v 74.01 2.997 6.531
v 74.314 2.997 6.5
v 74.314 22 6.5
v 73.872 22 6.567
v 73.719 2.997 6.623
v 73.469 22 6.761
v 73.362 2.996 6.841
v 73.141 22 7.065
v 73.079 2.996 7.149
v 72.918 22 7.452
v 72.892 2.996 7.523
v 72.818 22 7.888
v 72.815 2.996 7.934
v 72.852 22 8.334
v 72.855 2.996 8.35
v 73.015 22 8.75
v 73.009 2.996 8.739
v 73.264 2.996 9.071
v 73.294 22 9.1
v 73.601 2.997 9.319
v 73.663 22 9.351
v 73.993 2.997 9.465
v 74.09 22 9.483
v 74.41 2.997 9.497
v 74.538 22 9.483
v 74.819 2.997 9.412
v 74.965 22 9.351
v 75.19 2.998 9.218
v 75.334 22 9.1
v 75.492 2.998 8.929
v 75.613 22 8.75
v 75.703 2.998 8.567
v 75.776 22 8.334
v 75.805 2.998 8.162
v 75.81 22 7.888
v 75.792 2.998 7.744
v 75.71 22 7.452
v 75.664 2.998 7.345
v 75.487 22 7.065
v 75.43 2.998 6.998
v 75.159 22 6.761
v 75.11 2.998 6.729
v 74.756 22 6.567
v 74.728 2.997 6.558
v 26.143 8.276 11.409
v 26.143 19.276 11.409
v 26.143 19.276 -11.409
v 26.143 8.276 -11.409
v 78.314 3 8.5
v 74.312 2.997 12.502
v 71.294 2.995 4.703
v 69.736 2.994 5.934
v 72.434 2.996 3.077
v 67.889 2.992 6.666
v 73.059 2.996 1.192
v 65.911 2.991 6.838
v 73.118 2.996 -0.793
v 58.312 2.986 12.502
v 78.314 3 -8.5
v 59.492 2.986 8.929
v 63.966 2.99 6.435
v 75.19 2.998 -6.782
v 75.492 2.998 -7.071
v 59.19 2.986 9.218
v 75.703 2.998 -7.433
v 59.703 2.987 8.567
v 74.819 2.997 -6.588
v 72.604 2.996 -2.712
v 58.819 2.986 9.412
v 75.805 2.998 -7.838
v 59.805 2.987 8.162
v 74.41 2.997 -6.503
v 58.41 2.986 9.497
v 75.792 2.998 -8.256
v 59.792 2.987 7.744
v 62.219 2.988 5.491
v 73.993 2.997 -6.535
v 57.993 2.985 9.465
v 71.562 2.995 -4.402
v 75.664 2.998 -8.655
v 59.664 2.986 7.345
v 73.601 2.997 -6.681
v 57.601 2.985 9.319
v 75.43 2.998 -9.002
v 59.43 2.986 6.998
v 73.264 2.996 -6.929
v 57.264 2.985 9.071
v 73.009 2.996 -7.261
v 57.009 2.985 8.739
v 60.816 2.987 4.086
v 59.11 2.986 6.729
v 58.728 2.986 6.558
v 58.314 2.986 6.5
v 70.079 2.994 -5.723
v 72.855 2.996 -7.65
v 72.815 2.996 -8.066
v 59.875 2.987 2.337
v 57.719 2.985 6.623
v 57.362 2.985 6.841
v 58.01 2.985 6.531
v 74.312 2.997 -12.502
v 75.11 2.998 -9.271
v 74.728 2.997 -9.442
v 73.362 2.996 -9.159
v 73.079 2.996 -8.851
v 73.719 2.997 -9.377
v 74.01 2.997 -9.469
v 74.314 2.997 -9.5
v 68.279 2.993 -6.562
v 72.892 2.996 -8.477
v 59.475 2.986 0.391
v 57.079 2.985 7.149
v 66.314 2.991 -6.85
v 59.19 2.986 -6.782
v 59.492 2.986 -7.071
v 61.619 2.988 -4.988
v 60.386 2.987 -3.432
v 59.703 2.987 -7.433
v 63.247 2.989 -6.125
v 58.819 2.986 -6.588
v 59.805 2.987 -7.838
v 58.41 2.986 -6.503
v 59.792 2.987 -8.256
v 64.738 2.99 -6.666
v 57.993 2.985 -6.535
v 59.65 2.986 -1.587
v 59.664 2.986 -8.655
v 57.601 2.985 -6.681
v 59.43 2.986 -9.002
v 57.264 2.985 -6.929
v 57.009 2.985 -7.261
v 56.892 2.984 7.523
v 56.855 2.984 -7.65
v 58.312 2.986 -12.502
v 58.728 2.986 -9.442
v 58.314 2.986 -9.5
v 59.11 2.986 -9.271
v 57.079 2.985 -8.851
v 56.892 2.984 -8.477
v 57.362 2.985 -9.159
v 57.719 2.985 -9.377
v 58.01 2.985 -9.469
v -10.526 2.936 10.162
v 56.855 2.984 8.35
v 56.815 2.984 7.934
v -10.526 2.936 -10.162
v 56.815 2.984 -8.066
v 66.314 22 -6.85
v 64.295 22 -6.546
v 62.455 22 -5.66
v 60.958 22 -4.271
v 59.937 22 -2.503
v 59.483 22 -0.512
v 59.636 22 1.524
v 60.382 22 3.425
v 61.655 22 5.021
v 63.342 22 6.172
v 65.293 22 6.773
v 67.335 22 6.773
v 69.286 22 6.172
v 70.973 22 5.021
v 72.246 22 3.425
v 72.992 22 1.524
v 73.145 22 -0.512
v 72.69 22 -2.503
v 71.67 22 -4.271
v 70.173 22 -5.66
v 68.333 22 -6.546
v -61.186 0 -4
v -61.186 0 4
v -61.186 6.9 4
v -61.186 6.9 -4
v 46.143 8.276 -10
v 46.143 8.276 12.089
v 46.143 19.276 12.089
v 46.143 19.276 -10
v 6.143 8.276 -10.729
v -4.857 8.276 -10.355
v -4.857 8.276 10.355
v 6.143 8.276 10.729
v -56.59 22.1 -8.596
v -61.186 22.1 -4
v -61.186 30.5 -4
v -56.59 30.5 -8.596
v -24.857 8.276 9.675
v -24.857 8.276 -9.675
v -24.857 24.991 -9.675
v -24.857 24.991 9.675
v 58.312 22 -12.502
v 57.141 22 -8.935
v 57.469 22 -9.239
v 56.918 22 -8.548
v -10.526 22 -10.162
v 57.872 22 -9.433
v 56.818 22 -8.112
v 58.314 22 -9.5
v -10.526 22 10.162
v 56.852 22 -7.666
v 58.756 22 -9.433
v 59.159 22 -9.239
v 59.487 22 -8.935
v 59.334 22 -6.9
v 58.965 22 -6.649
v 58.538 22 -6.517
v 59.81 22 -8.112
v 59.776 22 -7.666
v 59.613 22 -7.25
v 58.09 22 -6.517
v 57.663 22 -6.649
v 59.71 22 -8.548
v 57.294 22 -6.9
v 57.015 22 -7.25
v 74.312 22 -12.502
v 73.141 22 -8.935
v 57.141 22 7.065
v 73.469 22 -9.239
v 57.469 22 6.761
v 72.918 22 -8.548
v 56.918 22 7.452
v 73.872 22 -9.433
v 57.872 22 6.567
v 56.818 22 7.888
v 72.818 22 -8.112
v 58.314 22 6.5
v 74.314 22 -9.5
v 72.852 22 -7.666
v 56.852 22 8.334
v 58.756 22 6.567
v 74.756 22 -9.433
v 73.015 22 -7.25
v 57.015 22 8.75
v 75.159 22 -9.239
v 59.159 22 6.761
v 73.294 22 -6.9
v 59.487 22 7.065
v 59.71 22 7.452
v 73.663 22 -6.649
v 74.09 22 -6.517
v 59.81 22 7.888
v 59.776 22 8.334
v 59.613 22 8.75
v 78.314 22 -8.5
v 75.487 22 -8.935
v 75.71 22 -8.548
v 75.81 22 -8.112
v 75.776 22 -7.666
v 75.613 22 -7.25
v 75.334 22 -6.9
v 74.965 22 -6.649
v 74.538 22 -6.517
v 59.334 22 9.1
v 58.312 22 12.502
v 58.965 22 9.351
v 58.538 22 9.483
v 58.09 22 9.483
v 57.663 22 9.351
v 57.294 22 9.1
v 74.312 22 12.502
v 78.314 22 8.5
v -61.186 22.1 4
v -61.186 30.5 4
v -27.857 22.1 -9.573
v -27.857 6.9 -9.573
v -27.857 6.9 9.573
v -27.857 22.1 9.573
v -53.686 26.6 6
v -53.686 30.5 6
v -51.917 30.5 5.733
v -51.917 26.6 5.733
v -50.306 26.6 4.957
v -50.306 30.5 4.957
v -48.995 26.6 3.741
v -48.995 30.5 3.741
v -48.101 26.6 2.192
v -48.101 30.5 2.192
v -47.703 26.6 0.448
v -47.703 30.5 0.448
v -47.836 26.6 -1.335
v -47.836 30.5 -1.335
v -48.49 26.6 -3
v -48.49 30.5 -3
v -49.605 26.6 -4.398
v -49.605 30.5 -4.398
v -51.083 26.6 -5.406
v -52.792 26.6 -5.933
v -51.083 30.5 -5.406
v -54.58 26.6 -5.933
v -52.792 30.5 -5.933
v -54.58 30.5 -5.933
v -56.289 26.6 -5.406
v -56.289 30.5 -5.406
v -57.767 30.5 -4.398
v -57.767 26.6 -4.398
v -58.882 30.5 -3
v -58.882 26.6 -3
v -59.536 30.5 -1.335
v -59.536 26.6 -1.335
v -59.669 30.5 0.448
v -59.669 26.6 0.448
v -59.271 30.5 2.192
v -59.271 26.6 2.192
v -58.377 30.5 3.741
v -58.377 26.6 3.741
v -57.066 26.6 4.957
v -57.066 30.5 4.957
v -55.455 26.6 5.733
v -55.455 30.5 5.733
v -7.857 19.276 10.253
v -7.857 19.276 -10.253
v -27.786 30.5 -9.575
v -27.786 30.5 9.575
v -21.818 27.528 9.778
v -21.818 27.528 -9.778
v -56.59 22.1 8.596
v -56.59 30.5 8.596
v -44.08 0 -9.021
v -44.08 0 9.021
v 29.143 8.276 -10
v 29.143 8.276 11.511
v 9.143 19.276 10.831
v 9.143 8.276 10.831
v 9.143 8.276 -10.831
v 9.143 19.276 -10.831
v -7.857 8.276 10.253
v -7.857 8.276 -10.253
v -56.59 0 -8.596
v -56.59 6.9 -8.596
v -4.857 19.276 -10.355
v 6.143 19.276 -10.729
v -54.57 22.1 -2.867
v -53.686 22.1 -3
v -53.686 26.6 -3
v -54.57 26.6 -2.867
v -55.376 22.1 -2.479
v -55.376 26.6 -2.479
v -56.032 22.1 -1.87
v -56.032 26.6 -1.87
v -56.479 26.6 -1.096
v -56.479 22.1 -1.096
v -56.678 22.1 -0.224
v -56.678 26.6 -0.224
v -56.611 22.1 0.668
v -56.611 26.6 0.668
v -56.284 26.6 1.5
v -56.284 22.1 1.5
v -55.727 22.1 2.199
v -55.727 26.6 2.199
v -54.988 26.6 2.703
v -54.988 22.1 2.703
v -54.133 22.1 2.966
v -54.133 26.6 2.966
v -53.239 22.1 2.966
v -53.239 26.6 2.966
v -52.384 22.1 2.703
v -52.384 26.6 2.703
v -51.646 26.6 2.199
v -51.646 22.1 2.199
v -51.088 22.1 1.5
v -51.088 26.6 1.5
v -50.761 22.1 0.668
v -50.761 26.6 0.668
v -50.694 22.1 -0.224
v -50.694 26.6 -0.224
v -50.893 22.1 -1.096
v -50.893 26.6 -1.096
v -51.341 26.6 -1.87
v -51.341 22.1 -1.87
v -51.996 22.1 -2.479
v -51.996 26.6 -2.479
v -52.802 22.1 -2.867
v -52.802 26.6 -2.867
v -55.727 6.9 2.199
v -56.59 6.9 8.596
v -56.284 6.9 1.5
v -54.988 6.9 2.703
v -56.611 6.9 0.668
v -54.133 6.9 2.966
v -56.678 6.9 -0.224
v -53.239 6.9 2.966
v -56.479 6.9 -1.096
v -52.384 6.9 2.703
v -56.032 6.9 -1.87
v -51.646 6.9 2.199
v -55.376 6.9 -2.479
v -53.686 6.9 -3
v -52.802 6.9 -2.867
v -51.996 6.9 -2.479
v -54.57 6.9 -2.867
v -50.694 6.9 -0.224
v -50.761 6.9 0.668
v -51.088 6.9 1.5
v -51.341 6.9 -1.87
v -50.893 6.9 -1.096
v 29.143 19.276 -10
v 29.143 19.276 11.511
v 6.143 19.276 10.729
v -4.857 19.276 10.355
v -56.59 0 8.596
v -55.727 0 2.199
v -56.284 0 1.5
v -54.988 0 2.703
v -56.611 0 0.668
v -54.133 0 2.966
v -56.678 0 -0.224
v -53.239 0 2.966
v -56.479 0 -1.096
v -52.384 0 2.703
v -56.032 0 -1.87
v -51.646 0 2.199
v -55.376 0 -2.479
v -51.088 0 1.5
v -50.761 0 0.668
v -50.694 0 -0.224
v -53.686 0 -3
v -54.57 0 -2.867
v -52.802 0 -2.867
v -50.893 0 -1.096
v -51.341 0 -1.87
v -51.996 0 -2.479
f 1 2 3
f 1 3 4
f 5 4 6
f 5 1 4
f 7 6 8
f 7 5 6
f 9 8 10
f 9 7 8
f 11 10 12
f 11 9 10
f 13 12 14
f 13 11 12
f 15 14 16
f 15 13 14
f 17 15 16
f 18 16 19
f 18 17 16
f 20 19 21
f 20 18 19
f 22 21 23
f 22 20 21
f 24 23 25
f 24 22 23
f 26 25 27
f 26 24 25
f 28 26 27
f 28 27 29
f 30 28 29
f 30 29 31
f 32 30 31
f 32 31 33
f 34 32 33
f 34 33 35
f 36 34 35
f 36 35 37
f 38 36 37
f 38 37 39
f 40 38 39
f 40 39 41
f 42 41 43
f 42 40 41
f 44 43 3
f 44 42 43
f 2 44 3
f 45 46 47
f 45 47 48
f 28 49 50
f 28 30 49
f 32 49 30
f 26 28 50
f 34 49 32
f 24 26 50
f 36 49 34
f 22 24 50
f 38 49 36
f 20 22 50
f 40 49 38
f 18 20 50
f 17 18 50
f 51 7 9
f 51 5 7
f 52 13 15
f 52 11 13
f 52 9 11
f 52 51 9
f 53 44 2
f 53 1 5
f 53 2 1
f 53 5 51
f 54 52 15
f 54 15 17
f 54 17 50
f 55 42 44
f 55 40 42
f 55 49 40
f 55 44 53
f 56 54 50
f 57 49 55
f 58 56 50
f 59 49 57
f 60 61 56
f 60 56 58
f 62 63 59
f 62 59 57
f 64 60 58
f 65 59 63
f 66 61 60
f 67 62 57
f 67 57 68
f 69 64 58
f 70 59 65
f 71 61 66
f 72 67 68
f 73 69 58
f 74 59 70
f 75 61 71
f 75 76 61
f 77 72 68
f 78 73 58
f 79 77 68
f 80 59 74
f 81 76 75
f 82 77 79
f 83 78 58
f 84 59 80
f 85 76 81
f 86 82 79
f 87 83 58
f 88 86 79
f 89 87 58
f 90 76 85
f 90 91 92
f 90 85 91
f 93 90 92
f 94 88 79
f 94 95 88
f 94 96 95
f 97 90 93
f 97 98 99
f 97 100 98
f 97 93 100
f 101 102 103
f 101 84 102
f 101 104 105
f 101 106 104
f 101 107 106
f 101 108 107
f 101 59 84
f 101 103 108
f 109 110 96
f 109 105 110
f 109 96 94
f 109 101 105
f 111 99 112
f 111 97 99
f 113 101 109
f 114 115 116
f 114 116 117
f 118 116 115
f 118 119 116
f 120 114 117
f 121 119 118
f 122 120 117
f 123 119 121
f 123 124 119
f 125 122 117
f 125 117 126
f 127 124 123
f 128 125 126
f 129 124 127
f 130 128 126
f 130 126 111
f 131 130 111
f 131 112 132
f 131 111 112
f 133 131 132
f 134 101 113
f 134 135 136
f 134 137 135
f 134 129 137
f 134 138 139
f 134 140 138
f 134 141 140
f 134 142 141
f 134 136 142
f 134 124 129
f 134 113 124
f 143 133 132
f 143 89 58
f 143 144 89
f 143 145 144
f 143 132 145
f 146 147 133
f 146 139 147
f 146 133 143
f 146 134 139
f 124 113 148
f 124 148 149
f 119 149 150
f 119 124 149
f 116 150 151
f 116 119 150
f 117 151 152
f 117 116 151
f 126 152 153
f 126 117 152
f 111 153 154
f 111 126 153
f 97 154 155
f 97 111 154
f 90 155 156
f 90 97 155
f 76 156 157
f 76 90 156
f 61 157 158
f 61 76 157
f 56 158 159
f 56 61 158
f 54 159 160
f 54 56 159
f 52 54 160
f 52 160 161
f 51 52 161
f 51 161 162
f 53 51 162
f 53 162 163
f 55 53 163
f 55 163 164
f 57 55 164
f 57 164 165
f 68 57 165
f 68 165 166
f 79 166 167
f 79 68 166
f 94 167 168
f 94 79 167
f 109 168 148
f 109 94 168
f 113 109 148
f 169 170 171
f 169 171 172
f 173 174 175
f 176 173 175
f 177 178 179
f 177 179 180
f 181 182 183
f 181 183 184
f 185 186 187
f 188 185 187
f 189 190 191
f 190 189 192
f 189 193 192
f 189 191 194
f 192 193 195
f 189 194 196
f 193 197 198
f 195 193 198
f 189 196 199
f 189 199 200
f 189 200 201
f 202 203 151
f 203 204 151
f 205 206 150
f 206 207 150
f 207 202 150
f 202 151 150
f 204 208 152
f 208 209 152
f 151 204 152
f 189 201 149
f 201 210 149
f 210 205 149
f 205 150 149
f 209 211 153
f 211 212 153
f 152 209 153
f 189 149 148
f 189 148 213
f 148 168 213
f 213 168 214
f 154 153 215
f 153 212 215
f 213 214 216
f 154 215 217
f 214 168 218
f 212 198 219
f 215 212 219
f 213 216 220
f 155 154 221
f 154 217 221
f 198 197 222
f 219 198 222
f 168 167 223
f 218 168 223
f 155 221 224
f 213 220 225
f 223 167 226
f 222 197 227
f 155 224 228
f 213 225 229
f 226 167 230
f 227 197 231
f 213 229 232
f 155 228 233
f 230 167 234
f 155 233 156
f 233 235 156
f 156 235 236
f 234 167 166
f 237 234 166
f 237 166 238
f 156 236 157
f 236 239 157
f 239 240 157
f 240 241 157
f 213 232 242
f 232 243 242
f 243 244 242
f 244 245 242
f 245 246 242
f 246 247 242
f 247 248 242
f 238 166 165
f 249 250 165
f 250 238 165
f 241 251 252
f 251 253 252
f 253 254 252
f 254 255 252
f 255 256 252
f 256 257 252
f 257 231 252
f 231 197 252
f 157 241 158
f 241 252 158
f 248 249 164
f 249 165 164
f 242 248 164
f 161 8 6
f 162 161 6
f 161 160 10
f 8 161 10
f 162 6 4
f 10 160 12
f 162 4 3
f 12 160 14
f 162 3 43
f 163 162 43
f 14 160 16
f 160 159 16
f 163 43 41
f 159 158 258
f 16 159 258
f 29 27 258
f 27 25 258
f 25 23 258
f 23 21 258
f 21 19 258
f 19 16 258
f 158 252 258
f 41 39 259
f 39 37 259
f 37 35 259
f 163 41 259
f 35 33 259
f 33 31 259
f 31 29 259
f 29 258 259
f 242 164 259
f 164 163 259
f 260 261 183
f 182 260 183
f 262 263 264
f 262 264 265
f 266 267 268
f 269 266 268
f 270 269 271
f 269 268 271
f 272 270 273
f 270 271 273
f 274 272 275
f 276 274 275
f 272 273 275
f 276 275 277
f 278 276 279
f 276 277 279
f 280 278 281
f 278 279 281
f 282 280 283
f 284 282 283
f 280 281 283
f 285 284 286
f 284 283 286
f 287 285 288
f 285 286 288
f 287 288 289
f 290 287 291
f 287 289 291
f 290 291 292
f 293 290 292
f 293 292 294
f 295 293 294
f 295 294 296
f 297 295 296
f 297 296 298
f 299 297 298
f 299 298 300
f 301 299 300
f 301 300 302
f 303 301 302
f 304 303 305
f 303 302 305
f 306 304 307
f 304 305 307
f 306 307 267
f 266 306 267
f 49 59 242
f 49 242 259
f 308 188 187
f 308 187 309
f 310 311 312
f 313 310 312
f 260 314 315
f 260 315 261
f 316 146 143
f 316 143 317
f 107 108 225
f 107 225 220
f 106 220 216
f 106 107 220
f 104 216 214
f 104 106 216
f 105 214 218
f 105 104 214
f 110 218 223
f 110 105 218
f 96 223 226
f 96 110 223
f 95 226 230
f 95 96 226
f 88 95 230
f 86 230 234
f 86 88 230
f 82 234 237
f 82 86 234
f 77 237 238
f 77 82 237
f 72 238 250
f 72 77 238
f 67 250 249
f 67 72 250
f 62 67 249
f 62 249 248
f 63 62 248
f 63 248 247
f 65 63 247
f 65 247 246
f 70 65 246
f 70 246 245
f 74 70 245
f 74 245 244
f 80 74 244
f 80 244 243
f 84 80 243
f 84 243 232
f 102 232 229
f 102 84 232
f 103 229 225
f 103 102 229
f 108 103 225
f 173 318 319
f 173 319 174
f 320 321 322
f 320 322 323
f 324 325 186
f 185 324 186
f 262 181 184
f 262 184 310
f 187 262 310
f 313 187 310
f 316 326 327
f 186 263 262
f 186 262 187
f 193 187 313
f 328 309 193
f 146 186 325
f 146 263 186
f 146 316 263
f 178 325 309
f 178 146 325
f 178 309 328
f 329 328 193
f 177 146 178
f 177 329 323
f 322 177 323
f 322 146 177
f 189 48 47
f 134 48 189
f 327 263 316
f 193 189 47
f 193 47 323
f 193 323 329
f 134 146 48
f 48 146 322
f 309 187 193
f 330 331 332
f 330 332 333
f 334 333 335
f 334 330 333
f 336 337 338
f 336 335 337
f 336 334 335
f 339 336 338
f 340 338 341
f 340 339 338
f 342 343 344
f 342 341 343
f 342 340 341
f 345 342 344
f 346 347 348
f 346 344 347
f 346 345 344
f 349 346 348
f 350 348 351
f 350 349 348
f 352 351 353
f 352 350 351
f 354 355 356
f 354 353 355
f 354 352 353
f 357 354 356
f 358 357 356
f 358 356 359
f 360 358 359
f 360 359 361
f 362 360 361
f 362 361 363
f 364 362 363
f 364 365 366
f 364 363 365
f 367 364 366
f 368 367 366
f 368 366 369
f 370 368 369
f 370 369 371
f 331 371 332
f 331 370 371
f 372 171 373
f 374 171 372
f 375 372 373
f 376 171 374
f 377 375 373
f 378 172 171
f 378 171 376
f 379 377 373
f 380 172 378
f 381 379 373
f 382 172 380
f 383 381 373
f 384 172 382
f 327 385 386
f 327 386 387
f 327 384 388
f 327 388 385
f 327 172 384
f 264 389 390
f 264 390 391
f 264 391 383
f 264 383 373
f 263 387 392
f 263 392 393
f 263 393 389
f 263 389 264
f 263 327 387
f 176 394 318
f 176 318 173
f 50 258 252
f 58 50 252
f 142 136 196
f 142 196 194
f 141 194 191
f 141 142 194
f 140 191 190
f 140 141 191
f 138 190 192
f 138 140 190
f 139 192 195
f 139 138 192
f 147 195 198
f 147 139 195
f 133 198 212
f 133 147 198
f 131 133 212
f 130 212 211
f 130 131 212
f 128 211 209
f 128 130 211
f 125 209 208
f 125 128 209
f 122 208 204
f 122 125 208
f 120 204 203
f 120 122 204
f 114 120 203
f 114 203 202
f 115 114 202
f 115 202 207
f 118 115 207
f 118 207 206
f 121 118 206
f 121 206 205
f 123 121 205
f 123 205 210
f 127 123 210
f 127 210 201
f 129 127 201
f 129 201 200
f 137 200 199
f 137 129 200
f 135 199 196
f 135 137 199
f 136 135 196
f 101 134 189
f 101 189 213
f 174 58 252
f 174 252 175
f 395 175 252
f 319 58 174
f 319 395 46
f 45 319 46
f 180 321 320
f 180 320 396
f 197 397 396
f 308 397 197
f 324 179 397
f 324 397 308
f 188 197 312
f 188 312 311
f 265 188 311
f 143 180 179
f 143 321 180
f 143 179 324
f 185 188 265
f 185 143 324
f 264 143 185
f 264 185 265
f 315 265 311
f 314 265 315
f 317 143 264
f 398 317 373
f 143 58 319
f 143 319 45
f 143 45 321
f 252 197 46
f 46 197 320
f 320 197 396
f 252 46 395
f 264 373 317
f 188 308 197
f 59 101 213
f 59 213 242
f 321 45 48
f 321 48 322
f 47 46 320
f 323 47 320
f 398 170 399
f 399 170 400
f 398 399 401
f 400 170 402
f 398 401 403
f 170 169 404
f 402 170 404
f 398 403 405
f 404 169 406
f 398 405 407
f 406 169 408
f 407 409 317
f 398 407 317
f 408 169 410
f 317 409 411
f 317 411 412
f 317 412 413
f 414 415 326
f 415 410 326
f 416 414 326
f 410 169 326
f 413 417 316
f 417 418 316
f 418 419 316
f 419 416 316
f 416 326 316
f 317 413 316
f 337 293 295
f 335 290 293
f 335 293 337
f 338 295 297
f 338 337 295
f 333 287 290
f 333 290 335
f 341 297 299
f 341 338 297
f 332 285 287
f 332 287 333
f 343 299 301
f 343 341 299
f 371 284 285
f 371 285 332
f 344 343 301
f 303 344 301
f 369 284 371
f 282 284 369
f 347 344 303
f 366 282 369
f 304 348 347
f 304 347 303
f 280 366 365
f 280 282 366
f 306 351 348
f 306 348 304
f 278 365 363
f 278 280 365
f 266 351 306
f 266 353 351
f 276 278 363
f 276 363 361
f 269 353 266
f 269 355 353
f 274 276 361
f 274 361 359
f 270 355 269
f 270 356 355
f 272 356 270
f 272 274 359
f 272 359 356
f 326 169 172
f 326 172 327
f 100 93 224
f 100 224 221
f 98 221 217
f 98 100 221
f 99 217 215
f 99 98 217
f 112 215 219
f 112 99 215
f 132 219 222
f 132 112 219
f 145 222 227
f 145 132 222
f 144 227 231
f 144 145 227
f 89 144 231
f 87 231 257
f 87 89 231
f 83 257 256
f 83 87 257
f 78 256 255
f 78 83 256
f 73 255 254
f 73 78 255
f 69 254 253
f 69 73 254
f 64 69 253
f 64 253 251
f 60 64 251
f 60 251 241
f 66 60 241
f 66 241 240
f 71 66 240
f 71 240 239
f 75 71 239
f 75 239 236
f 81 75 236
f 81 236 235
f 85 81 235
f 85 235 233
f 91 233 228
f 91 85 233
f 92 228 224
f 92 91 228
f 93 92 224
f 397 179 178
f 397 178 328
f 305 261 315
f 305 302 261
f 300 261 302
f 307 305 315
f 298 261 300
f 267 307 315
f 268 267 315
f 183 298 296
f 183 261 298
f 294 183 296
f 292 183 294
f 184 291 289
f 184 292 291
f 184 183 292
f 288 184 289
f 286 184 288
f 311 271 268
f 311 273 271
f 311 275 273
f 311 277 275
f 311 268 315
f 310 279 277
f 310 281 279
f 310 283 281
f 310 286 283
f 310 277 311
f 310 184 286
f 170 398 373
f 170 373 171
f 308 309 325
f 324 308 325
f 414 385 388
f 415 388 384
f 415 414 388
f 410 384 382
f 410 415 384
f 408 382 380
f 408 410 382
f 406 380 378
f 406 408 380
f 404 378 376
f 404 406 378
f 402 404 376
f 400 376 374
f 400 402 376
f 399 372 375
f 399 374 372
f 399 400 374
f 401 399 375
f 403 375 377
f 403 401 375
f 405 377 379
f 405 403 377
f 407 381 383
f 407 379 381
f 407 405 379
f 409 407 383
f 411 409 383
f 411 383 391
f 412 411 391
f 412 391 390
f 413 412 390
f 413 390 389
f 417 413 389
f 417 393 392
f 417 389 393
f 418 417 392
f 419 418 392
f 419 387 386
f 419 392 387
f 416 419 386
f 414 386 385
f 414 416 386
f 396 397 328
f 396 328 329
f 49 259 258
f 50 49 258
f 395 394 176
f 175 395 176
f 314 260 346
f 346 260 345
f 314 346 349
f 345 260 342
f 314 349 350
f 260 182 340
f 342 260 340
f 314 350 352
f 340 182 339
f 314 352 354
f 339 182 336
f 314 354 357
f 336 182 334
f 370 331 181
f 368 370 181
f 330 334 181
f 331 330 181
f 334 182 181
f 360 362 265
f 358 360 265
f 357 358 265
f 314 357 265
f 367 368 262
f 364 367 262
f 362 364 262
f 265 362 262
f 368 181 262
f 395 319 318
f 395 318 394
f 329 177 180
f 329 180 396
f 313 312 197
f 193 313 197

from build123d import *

# Parameters (mm, degrees)
SKETCH1_R           = 1.5
SKETCH1_R_2         = 3
SKETCH1_R_3         = 6.85
BOSS_EXTRUDE1_DEPTH = 30.5
CUT_EXTRUDE1_START  = 30.5
SKETCH1_3_R         = 6
CUT_EXTRUDE1_DEPTH  = 3.9
SKETCH1_4_R         = 7.8
CUT_EXTRUDE2_DEPTH  = 0.75
CUT_EXTRUDE3_START  = 30.5
SKETCH1_5_R         = 7.8
CUT_EXTRUDE3_DEPTH  = 1.5
SKETCH3_W           = 33.329175537
SKETCH3_H           = 15.2
CUT_EXTRUDE4_DEPTH  = 25
SKETCH4_W           = 11
SKETCH4_H           = 11
SKETCH4_W_2         = 17
CUT_EXTRUDE5_DEPTH  = 25
CUT_EXTRUDE6_START  = 20
SKETCH4_3_W         = 17
SKETCH4_3_H         = 11
CUT_EXTRUDE6_DEPTH  = 30


with BuildPart() as part:
    # Sketch1 → Boss-Extrude1 (new body)
    with BuildSketch(Plane(origin=(0, 0, 0), x_dir=(1, 0, 0), z_dir=(0, 1, 0))):
        Polygon((78.313978899, -8.5), (78.313978899, 8.5), (74.311754517, 12.502224382), (58.311754517, 12.502224382), (-56.589827024, 8.596194078), (-61.186021101, 4), (-61.186021101, -4), (-56.589827024, -8.596194078), (58.311754517, -12.502224382), (74.311754517, -12.502224382), align=None)
        with Locations((58.313978899, -8)):
            Circle(SKETCH1_R, mode=Mode.SUBTRACT)
        with Locations((74.313978899, -8)):
            Circle(SKETCH1_R, mode=Mode.SUBTRACT)
        with Locations((58.313978899, 8)):
            Circle(SKETCH1_R, mode=Mode.SUBTRACT)
        with Locations((74.313978899, 8)):
            Circle(SKETCH1_R, mode=Mode.SUBTRACT)
        with Locations((-53.686021101, 0)):
            Circle(SKETCH1_R_2, mode=Mode.SUBTRACT)
        with Locations((66.313978899, 0)):
            Circle(SKETCH1_R_3, mode=Mode.SUBTRACT)
    extrude(amount=BOSS_EXTRUDE1_DEPTH)

    # Sketch1<3> → Cut-Extrude1 (cut)
    with BuildSketch(Plane(origin=(0, 0, 0), x_dir=(1, 0, 0), z_dir=(0, 1, 0)).offset(CUT_EXTRUDE1_START)):
        with Locations((-53.686021101, 0)):
            Circle(SKETCH1_3_R)
    extrude(amount=-CUT_EXTRUDE1_DEPTH, mode=Mode.SUBTRACT)

    # Sketch1<4> → Cut-Extrude2 (cut, symmetric)
    with BuildSketch(Plane(origin=(0, 0, 0), x_dir=(1, 0, 0), z_dir=(0, 1, 0))):
        with Locations((66.313978899, 0)):
            Circle(SKETCH1_4_R)
    extrude(amount=CUT_EXTRUDE2_DEPTH, both=True, mode=Mode.SUBTRACT)

    # Sketch1<5> → Cut-Extrude3 (cut)
    with BuildSketch(Plane(origin=(0, 0, 0), x_dir=(1, 0, 0), z_dir=(0, 1, 0)).offset(CUT_EXTRUDE3_START)):
        with Locations((66.313978899, 0)):
            Circle(SKETCH1_5_R)
    extrude(amount=-CUT_EXTRUDE3_DEPTH, mode=Mode.SUBTRACT)

    # Sketch3 → Cut-Extrude4 (cut, symmetric)
    with BuildSketch(Plane.XY):
        with Locations((-44.521433333, 14.5)):
            Rectangle(SKETCH3_W, SKETCH3_H)
        Polygon((78.313978899, 0), (78.313978899, 3), (-10.526021101, 2.935632814), (-44.080457712, 0), (9.374237964, -19.733731398), align=None)
        Polygon((-10.526021101, 22), (78.313978899, 22), (78.313978899, 30.5), (39.447370773, 56.936233567), (-27.786021101, 30.5), (-21.817807348, 27.528259132), align=None)
    extrude(amount=CUT_EXTRUDE4_DEPTH, both=True, mode=Mode.SUBTRACT)

    # Sketch4 → Cut-Extrude5 (cut, symmetric)
    with BuildSketch(Plane.XY):
        Polygon((-24.856845564, 24.991492085), (-24.856845564, 8.276006159), (-7.856845564, 8.276006159), (-7.856845564, 19.276006159), align=None)
        with Locations((0.643154436, 13.776006159)):
            Rectangle(SKETCH4_W, SKETCH4_H)
        with Locations((17.643154436, 13.776006159)):
            Rectangle(SKETCH4_W_2, SKETCH4_H)
    extrude(amount=CUT_EXTRUDE5_DEPTH, both=True, mode=Mode.SUBTRACT)

    # Sketch4<3> → Cut-Extrude6 (cut)
    with BuildSketch(Plane.XY.offset(CUT_EXTRUDE6_START)):
        with Locations((37.643154436, 13.776006159)):
            Rectangle(SKETCH4_3_W, SKETCH4_3_H)
    extrude(amount=-CUT_EXTRUDE6_DEPTH, mode=Mode.SUBTRACT)


solid = part.part
